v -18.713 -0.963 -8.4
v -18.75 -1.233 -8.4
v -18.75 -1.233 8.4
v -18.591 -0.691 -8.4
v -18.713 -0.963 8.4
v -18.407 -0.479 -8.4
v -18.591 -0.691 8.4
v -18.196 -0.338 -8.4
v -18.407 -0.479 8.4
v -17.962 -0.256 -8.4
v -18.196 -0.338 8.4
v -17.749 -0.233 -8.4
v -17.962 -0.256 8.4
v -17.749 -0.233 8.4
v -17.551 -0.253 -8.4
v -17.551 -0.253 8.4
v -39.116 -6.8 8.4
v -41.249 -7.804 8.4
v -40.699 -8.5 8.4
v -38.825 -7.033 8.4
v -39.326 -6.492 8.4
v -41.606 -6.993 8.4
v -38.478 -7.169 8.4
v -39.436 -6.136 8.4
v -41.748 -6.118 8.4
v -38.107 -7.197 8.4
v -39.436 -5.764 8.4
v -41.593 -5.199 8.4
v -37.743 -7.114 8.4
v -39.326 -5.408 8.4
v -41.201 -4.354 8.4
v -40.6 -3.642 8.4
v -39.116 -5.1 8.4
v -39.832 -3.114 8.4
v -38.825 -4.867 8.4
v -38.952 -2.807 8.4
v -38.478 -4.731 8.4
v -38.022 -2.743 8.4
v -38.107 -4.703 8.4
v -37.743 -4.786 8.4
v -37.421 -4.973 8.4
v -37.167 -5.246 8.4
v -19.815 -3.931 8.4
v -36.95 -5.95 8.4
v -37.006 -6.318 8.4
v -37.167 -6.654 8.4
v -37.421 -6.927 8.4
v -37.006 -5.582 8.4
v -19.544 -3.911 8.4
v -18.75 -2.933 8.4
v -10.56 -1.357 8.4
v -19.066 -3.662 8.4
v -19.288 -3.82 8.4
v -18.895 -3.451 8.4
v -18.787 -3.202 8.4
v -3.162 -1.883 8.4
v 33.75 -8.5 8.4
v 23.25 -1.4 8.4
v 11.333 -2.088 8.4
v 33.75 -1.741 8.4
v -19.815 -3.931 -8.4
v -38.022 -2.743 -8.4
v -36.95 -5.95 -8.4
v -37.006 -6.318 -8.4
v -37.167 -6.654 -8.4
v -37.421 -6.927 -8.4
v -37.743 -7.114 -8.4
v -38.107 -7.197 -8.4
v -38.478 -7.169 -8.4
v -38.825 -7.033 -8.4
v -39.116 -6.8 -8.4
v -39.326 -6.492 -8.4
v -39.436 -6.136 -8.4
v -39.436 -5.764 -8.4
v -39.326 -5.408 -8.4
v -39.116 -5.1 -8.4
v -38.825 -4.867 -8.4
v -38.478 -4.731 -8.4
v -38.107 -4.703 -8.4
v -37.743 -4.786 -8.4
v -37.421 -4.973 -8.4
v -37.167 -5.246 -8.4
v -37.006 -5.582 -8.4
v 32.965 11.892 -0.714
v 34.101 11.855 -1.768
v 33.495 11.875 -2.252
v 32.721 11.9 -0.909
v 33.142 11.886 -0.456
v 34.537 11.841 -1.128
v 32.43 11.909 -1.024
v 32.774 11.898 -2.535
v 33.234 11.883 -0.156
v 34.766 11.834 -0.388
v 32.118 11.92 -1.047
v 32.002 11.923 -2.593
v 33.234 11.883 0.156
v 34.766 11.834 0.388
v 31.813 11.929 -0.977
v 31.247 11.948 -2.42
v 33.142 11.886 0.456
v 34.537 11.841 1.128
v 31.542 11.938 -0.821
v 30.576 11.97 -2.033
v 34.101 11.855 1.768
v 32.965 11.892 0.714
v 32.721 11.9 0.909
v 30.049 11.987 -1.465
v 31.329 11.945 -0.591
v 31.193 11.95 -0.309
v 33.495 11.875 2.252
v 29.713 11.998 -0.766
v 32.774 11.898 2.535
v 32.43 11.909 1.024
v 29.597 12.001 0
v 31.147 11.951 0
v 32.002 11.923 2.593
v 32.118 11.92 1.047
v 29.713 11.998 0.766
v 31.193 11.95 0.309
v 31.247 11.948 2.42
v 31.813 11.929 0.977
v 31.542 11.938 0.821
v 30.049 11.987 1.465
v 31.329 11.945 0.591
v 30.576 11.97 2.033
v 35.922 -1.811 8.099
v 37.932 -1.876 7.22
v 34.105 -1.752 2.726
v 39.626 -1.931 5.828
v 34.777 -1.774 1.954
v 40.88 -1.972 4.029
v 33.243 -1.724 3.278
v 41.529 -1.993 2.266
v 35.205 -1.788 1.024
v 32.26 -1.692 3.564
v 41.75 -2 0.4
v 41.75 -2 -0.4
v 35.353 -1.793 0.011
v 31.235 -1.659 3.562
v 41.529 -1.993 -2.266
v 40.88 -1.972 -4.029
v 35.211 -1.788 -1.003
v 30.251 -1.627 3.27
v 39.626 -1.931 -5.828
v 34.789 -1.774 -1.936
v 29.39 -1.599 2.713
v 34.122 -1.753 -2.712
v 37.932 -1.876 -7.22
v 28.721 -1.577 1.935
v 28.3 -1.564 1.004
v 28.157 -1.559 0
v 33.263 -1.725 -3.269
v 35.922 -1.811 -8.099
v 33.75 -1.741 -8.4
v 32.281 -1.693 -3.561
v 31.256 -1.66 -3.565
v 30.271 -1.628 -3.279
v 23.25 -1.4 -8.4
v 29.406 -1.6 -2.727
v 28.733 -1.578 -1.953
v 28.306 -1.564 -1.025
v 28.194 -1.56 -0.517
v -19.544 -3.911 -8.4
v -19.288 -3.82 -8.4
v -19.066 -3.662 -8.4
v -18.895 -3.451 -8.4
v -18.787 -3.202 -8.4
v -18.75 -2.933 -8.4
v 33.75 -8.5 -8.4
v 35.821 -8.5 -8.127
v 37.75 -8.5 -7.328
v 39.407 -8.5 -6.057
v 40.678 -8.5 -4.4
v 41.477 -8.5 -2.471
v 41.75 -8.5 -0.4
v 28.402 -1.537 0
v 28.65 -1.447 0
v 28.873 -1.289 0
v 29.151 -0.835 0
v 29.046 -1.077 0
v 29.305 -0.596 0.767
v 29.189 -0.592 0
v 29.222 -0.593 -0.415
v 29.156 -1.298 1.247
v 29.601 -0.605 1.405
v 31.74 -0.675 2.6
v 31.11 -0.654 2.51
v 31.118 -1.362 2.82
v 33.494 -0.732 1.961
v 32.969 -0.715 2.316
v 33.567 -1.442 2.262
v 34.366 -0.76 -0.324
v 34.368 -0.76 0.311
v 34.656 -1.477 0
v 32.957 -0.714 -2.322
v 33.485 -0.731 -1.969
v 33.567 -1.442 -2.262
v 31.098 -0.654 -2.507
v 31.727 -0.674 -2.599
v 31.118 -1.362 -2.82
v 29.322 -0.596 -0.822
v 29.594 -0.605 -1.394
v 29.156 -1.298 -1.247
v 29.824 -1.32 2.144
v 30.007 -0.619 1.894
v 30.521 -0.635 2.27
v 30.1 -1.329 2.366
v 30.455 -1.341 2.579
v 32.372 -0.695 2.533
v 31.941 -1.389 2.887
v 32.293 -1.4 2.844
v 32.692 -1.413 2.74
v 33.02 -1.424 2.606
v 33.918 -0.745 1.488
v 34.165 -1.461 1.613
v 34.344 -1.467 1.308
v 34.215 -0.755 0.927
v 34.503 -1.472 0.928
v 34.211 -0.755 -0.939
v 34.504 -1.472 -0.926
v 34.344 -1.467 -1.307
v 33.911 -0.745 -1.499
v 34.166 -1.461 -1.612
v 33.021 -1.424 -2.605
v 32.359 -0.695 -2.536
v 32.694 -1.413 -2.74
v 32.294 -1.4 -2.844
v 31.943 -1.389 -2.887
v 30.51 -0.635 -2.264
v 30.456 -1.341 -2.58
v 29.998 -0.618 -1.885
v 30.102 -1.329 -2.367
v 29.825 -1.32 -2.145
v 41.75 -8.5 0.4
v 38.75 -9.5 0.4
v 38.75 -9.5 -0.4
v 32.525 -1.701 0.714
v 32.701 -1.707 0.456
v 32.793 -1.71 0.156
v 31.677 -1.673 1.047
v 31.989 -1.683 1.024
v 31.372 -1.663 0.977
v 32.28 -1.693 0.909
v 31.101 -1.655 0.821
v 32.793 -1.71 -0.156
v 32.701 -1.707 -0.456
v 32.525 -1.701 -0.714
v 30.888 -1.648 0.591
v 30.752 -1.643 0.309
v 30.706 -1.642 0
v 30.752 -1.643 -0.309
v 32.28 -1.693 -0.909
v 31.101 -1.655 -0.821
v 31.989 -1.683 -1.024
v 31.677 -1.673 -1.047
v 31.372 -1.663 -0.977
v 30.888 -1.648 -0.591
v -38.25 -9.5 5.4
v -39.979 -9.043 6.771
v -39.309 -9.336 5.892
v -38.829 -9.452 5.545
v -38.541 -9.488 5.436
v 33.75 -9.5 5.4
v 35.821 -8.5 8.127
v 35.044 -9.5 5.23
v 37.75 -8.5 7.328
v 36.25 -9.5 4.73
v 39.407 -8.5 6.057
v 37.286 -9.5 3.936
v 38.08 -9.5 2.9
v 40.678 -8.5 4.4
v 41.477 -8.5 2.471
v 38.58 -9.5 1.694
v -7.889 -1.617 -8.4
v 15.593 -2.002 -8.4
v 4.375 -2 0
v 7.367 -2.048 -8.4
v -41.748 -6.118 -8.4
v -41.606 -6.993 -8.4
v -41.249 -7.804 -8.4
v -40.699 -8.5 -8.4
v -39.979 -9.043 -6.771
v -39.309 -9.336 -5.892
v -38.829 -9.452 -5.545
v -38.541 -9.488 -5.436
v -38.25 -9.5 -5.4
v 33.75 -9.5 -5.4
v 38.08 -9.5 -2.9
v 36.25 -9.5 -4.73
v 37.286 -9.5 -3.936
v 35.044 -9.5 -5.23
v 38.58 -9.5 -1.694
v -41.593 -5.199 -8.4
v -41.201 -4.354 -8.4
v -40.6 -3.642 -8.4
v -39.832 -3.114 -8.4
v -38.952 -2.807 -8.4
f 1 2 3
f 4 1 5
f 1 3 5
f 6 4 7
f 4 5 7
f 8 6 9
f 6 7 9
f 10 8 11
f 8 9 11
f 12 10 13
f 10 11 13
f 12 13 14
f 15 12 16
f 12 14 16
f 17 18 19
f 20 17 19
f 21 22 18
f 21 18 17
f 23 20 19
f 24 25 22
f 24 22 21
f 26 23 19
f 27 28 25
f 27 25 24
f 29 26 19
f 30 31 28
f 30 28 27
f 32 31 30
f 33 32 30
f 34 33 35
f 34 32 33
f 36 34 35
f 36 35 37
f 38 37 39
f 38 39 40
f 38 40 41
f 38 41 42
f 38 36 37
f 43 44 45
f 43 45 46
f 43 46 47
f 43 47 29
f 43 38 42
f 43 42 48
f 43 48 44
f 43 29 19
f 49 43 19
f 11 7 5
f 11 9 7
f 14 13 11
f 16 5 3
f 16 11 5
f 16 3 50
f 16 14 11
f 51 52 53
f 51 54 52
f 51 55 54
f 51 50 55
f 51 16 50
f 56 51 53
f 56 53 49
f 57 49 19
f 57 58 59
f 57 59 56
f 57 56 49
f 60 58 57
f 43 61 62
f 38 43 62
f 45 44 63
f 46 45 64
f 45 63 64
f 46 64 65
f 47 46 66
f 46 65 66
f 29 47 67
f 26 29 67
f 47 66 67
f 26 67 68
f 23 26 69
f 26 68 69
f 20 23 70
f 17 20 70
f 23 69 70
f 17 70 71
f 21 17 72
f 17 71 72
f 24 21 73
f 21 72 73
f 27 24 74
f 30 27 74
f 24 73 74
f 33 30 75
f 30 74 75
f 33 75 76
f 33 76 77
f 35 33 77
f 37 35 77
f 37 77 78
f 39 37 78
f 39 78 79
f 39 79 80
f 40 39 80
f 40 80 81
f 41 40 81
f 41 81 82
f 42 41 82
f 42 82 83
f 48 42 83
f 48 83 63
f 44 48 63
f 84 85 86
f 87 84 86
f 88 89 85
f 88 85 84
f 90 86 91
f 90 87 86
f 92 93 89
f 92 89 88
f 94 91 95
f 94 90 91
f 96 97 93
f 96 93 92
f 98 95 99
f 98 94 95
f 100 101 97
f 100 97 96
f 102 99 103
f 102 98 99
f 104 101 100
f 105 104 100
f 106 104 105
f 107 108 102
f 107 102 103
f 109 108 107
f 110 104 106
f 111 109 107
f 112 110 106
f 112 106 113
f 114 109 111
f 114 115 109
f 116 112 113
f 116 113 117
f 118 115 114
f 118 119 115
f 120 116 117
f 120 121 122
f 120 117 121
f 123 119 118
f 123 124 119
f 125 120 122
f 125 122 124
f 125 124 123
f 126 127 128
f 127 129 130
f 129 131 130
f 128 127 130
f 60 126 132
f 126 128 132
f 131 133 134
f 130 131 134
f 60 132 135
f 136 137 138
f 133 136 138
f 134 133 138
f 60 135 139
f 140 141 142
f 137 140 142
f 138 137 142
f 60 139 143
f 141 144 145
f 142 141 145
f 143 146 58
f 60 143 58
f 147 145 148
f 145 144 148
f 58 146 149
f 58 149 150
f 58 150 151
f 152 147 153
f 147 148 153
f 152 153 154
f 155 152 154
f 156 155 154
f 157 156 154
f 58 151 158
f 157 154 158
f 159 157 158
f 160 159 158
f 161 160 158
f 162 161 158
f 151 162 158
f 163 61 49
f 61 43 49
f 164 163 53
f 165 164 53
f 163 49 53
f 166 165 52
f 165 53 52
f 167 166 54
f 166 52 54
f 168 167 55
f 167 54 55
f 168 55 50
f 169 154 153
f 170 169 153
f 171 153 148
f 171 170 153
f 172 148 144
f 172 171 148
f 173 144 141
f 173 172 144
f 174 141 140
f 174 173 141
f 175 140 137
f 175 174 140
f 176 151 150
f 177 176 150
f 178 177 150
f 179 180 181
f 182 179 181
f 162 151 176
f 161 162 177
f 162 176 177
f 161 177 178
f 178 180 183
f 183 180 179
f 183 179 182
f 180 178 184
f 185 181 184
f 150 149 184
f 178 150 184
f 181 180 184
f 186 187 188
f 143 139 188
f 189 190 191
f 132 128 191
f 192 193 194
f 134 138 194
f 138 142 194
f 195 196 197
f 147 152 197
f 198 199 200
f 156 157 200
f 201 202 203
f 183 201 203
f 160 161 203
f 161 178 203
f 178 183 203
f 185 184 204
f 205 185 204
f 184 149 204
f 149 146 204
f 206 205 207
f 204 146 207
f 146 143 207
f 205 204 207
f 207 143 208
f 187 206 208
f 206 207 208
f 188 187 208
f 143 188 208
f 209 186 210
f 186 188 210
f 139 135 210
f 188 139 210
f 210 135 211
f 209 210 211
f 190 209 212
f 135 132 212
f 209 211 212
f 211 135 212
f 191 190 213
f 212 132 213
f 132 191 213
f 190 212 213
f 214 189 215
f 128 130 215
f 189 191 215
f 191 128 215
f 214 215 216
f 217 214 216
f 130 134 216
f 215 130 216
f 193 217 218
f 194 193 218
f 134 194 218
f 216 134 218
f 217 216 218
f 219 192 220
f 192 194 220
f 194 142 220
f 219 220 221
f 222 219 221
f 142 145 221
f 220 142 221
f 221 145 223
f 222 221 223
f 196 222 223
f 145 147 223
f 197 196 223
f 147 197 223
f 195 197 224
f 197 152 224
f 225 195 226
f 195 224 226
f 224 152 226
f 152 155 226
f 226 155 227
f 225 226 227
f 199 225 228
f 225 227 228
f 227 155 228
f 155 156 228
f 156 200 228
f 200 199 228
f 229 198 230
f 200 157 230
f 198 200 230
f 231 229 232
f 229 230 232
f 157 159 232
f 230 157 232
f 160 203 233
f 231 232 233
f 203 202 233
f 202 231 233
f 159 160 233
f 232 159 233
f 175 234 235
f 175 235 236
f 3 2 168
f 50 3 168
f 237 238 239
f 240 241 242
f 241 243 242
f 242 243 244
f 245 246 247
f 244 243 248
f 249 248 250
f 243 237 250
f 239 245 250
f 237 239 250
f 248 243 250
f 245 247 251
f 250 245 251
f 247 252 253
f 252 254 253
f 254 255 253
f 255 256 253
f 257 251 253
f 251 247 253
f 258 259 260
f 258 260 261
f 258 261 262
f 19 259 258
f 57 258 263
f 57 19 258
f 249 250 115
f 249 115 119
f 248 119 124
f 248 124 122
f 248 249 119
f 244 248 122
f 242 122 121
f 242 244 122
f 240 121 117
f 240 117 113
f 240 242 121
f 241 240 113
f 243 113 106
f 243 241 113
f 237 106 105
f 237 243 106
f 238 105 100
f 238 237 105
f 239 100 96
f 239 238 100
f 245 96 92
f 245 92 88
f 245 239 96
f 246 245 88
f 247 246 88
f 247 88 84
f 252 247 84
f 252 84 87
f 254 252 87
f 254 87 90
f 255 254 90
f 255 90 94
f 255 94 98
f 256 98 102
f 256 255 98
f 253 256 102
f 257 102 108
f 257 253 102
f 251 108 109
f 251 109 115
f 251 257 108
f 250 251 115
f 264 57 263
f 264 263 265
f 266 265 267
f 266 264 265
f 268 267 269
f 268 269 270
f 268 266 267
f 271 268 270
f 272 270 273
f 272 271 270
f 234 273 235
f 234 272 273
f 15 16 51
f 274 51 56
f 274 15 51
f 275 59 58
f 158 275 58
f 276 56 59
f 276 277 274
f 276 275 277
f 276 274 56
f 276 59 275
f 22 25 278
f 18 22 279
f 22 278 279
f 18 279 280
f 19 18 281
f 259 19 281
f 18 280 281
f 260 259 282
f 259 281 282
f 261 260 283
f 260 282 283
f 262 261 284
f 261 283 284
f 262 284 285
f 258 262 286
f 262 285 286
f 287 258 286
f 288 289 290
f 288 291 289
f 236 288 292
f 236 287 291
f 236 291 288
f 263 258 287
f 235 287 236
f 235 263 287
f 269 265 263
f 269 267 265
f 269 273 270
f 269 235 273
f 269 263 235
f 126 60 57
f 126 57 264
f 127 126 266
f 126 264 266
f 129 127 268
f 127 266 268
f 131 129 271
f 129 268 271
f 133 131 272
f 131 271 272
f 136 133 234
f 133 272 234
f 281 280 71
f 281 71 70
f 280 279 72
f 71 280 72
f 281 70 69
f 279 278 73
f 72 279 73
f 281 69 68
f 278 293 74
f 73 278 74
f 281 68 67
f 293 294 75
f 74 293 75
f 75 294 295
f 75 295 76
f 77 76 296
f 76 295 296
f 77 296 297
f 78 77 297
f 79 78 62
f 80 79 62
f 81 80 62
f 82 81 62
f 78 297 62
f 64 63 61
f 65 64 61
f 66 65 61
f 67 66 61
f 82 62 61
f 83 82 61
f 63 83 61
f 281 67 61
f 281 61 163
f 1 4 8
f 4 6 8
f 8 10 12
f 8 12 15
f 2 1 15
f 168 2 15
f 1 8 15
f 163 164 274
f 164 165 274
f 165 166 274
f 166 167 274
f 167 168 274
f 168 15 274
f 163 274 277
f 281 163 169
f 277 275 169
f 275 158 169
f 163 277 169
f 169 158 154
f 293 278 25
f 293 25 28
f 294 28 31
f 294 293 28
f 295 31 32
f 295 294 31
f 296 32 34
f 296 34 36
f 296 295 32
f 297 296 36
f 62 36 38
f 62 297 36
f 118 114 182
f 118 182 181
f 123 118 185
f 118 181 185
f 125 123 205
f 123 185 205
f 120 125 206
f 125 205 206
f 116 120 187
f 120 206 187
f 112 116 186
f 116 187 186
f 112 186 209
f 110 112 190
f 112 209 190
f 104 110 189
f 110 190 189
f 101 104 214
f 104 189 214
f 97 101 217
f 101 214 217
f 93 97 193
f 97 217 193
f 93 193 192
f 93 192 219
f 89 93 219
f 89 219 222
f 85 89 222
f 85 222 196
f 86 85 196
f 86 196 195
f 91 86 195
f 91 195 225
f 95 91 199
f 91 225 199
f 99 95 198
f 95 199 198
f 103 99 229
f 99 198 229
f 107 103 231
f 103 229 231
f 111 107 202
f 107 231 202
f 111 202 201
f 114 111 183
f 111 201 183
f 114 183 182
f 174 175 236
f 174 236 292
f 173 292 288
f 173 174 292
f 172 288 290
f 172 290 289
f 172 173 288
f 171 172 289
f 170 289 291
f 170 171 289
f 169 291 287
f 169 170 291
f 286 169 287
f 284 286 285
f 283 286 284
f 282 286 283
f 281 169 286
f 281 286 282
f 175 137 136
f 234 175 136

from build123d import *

# Parameters (mm, degrees)
F0_W        = 83.5
F0_H        = 16.8
F1_DEPTH    = 9.5
F2_R        = 1.25
F3_DEPTH    = 25
F4_R        = 2.6
F4_R_2      = 1.05
F5_DEPTH    = 13.6
F6_R        = 1
F7_R        = 8
F8_SIZE2    = 1
F8_SIZE     = 3
F9_T1_DEPTH = 35.4784813046
F9_T3_DEPTH = 40.55


# Not quite as in the source:
# - a fillet or chamfer that OpenCascade refuses, or shapes differently, is made with other operations: its cross-section is extruded or revolved along the edge and cut away or added
# - a feature names something its author has since deleted; it is built from what else it names


with BuildPart() as f1:
    # F0 (on Front) → F1 (new body)
    with BuildSketch(Plane.XZ):
        Rectangle(F0_W, F0_H)
    extrude(amount=F1_DEPTH)

    # F2 (on face) → F3 (cut)
    with BuildSketch(Plane(origin=(0, 0, -8.4), x_dir=(1, 0, 0), z_dir=(0, 0, -1))):
        with Locations((-38.2, 5.95)):
            Circle(F2_R)
        Polygon((-18.75, 0), (-18.75, 4), (-41.75, 2.5), (-41.75, 0), align=None)
        with BuildLine():
            add(Edge.make_bspline(
                [(-18.75, 0), (-9.2352803439, 2.081155549), (4.6071284628, 1.7784279246), (15.029287035, 2.3336862795), (23.25, 1.4)],
                knots=[0, 0, 0, 0, 0.5257635341, 1, 1, 1, 1], degree=3))
            Line((-18.75, 0), (41.75, 0))
            Line((41.75, 0), (41.75, 2))
            Line((41.75, 2), (23.25, 1.4))
        make_face()
    extrude(amount=-F3_DEPTH, mode=Mode.SUBTRACT)

    # F4 (on face) → F5 (join)
    with BuildSketch(Plane(origin=(-0.0209275853, -0.6452672134, 0), x_dir=(-0.9994744832, 0.0324153886, 0), z_dir=(0.0324153886, 0.9994744832, 0))):
        with Locations((-31.7928904511, 0)):
            Circle(F4_R)
        with Locations((-31.7928904511, 0)):
            Circle(F4_R_2, mode=Mode.SUBTRACT)
    extrude(amount=F5_DEPTH)

    # F6
    f6_edges = [f1.edges().sort_by_distance(p)[0] for p in [
        (-18.75, -4, 0),
        (34.353889, -1.760126, 0),
        (-18.75, 0, 0),
    ]]
    fillet(f6_edges, radius=F6_R)

    # F7
    f7_edges = [f1.edges().sort_by_distance(p)[0] for p in [
        (41.75, -5.75, 8.4),
        (41.75, -5.75, -8.4),
    ]]
    fillet(f7_edges, radius=F7_R)

    # F8
    f8_edges = [f1.edges().sort_by_distance(p)[0] for p in [
        (-4, -9.5, 8.4),
    ]]
    f8_side = f1.faces().sort_by_distance((-0.798169, -9.5, 0))[0]
    chamfer(f8_edges, length=F8_SIZE, length2=F8_SIZE2, reference=f8_side)

    # F9: fillet of radius 3.5 on 2 edges, made by hand

    # F9_s2 → F9_t1 (cut)
    with BuildSketch(Plane.XY.offset(-17.7392406523)):
        with BuildLine():
            ThreePointArc((-41.75, -6.2356962609), (-40.6429877316, -3.6815604548), (-38.0222230193, -2.74311589))
            Line((-38.0222230193, -2.74311589), (-41.75, -2.5))
            Line((-41.75, -2.5), (-41.75, -6.2356962609))
        make_face()
    extrude(amount=F9_T1_DEPTH, mode=Mode.SUBTRACT)

    # F9_s4 → F9_t3 (cut)
    with BuildSketch(Plane.XY.offset(-20.275)):
        with BuildLine():
            ThreePointArc((-41.75, -6), (-40.7248737342, -8.4748737342), (-38.25, -9.5))
            Line((-38.25, -9.5), (-41.75, -9.5))
            Line((-41.75, -9.5), (-41.75, -6))
        make_face()
    extrude(amount=F9_T3_DEPTH, mode=Mode.SUBTRACT)


solid = f1.part
